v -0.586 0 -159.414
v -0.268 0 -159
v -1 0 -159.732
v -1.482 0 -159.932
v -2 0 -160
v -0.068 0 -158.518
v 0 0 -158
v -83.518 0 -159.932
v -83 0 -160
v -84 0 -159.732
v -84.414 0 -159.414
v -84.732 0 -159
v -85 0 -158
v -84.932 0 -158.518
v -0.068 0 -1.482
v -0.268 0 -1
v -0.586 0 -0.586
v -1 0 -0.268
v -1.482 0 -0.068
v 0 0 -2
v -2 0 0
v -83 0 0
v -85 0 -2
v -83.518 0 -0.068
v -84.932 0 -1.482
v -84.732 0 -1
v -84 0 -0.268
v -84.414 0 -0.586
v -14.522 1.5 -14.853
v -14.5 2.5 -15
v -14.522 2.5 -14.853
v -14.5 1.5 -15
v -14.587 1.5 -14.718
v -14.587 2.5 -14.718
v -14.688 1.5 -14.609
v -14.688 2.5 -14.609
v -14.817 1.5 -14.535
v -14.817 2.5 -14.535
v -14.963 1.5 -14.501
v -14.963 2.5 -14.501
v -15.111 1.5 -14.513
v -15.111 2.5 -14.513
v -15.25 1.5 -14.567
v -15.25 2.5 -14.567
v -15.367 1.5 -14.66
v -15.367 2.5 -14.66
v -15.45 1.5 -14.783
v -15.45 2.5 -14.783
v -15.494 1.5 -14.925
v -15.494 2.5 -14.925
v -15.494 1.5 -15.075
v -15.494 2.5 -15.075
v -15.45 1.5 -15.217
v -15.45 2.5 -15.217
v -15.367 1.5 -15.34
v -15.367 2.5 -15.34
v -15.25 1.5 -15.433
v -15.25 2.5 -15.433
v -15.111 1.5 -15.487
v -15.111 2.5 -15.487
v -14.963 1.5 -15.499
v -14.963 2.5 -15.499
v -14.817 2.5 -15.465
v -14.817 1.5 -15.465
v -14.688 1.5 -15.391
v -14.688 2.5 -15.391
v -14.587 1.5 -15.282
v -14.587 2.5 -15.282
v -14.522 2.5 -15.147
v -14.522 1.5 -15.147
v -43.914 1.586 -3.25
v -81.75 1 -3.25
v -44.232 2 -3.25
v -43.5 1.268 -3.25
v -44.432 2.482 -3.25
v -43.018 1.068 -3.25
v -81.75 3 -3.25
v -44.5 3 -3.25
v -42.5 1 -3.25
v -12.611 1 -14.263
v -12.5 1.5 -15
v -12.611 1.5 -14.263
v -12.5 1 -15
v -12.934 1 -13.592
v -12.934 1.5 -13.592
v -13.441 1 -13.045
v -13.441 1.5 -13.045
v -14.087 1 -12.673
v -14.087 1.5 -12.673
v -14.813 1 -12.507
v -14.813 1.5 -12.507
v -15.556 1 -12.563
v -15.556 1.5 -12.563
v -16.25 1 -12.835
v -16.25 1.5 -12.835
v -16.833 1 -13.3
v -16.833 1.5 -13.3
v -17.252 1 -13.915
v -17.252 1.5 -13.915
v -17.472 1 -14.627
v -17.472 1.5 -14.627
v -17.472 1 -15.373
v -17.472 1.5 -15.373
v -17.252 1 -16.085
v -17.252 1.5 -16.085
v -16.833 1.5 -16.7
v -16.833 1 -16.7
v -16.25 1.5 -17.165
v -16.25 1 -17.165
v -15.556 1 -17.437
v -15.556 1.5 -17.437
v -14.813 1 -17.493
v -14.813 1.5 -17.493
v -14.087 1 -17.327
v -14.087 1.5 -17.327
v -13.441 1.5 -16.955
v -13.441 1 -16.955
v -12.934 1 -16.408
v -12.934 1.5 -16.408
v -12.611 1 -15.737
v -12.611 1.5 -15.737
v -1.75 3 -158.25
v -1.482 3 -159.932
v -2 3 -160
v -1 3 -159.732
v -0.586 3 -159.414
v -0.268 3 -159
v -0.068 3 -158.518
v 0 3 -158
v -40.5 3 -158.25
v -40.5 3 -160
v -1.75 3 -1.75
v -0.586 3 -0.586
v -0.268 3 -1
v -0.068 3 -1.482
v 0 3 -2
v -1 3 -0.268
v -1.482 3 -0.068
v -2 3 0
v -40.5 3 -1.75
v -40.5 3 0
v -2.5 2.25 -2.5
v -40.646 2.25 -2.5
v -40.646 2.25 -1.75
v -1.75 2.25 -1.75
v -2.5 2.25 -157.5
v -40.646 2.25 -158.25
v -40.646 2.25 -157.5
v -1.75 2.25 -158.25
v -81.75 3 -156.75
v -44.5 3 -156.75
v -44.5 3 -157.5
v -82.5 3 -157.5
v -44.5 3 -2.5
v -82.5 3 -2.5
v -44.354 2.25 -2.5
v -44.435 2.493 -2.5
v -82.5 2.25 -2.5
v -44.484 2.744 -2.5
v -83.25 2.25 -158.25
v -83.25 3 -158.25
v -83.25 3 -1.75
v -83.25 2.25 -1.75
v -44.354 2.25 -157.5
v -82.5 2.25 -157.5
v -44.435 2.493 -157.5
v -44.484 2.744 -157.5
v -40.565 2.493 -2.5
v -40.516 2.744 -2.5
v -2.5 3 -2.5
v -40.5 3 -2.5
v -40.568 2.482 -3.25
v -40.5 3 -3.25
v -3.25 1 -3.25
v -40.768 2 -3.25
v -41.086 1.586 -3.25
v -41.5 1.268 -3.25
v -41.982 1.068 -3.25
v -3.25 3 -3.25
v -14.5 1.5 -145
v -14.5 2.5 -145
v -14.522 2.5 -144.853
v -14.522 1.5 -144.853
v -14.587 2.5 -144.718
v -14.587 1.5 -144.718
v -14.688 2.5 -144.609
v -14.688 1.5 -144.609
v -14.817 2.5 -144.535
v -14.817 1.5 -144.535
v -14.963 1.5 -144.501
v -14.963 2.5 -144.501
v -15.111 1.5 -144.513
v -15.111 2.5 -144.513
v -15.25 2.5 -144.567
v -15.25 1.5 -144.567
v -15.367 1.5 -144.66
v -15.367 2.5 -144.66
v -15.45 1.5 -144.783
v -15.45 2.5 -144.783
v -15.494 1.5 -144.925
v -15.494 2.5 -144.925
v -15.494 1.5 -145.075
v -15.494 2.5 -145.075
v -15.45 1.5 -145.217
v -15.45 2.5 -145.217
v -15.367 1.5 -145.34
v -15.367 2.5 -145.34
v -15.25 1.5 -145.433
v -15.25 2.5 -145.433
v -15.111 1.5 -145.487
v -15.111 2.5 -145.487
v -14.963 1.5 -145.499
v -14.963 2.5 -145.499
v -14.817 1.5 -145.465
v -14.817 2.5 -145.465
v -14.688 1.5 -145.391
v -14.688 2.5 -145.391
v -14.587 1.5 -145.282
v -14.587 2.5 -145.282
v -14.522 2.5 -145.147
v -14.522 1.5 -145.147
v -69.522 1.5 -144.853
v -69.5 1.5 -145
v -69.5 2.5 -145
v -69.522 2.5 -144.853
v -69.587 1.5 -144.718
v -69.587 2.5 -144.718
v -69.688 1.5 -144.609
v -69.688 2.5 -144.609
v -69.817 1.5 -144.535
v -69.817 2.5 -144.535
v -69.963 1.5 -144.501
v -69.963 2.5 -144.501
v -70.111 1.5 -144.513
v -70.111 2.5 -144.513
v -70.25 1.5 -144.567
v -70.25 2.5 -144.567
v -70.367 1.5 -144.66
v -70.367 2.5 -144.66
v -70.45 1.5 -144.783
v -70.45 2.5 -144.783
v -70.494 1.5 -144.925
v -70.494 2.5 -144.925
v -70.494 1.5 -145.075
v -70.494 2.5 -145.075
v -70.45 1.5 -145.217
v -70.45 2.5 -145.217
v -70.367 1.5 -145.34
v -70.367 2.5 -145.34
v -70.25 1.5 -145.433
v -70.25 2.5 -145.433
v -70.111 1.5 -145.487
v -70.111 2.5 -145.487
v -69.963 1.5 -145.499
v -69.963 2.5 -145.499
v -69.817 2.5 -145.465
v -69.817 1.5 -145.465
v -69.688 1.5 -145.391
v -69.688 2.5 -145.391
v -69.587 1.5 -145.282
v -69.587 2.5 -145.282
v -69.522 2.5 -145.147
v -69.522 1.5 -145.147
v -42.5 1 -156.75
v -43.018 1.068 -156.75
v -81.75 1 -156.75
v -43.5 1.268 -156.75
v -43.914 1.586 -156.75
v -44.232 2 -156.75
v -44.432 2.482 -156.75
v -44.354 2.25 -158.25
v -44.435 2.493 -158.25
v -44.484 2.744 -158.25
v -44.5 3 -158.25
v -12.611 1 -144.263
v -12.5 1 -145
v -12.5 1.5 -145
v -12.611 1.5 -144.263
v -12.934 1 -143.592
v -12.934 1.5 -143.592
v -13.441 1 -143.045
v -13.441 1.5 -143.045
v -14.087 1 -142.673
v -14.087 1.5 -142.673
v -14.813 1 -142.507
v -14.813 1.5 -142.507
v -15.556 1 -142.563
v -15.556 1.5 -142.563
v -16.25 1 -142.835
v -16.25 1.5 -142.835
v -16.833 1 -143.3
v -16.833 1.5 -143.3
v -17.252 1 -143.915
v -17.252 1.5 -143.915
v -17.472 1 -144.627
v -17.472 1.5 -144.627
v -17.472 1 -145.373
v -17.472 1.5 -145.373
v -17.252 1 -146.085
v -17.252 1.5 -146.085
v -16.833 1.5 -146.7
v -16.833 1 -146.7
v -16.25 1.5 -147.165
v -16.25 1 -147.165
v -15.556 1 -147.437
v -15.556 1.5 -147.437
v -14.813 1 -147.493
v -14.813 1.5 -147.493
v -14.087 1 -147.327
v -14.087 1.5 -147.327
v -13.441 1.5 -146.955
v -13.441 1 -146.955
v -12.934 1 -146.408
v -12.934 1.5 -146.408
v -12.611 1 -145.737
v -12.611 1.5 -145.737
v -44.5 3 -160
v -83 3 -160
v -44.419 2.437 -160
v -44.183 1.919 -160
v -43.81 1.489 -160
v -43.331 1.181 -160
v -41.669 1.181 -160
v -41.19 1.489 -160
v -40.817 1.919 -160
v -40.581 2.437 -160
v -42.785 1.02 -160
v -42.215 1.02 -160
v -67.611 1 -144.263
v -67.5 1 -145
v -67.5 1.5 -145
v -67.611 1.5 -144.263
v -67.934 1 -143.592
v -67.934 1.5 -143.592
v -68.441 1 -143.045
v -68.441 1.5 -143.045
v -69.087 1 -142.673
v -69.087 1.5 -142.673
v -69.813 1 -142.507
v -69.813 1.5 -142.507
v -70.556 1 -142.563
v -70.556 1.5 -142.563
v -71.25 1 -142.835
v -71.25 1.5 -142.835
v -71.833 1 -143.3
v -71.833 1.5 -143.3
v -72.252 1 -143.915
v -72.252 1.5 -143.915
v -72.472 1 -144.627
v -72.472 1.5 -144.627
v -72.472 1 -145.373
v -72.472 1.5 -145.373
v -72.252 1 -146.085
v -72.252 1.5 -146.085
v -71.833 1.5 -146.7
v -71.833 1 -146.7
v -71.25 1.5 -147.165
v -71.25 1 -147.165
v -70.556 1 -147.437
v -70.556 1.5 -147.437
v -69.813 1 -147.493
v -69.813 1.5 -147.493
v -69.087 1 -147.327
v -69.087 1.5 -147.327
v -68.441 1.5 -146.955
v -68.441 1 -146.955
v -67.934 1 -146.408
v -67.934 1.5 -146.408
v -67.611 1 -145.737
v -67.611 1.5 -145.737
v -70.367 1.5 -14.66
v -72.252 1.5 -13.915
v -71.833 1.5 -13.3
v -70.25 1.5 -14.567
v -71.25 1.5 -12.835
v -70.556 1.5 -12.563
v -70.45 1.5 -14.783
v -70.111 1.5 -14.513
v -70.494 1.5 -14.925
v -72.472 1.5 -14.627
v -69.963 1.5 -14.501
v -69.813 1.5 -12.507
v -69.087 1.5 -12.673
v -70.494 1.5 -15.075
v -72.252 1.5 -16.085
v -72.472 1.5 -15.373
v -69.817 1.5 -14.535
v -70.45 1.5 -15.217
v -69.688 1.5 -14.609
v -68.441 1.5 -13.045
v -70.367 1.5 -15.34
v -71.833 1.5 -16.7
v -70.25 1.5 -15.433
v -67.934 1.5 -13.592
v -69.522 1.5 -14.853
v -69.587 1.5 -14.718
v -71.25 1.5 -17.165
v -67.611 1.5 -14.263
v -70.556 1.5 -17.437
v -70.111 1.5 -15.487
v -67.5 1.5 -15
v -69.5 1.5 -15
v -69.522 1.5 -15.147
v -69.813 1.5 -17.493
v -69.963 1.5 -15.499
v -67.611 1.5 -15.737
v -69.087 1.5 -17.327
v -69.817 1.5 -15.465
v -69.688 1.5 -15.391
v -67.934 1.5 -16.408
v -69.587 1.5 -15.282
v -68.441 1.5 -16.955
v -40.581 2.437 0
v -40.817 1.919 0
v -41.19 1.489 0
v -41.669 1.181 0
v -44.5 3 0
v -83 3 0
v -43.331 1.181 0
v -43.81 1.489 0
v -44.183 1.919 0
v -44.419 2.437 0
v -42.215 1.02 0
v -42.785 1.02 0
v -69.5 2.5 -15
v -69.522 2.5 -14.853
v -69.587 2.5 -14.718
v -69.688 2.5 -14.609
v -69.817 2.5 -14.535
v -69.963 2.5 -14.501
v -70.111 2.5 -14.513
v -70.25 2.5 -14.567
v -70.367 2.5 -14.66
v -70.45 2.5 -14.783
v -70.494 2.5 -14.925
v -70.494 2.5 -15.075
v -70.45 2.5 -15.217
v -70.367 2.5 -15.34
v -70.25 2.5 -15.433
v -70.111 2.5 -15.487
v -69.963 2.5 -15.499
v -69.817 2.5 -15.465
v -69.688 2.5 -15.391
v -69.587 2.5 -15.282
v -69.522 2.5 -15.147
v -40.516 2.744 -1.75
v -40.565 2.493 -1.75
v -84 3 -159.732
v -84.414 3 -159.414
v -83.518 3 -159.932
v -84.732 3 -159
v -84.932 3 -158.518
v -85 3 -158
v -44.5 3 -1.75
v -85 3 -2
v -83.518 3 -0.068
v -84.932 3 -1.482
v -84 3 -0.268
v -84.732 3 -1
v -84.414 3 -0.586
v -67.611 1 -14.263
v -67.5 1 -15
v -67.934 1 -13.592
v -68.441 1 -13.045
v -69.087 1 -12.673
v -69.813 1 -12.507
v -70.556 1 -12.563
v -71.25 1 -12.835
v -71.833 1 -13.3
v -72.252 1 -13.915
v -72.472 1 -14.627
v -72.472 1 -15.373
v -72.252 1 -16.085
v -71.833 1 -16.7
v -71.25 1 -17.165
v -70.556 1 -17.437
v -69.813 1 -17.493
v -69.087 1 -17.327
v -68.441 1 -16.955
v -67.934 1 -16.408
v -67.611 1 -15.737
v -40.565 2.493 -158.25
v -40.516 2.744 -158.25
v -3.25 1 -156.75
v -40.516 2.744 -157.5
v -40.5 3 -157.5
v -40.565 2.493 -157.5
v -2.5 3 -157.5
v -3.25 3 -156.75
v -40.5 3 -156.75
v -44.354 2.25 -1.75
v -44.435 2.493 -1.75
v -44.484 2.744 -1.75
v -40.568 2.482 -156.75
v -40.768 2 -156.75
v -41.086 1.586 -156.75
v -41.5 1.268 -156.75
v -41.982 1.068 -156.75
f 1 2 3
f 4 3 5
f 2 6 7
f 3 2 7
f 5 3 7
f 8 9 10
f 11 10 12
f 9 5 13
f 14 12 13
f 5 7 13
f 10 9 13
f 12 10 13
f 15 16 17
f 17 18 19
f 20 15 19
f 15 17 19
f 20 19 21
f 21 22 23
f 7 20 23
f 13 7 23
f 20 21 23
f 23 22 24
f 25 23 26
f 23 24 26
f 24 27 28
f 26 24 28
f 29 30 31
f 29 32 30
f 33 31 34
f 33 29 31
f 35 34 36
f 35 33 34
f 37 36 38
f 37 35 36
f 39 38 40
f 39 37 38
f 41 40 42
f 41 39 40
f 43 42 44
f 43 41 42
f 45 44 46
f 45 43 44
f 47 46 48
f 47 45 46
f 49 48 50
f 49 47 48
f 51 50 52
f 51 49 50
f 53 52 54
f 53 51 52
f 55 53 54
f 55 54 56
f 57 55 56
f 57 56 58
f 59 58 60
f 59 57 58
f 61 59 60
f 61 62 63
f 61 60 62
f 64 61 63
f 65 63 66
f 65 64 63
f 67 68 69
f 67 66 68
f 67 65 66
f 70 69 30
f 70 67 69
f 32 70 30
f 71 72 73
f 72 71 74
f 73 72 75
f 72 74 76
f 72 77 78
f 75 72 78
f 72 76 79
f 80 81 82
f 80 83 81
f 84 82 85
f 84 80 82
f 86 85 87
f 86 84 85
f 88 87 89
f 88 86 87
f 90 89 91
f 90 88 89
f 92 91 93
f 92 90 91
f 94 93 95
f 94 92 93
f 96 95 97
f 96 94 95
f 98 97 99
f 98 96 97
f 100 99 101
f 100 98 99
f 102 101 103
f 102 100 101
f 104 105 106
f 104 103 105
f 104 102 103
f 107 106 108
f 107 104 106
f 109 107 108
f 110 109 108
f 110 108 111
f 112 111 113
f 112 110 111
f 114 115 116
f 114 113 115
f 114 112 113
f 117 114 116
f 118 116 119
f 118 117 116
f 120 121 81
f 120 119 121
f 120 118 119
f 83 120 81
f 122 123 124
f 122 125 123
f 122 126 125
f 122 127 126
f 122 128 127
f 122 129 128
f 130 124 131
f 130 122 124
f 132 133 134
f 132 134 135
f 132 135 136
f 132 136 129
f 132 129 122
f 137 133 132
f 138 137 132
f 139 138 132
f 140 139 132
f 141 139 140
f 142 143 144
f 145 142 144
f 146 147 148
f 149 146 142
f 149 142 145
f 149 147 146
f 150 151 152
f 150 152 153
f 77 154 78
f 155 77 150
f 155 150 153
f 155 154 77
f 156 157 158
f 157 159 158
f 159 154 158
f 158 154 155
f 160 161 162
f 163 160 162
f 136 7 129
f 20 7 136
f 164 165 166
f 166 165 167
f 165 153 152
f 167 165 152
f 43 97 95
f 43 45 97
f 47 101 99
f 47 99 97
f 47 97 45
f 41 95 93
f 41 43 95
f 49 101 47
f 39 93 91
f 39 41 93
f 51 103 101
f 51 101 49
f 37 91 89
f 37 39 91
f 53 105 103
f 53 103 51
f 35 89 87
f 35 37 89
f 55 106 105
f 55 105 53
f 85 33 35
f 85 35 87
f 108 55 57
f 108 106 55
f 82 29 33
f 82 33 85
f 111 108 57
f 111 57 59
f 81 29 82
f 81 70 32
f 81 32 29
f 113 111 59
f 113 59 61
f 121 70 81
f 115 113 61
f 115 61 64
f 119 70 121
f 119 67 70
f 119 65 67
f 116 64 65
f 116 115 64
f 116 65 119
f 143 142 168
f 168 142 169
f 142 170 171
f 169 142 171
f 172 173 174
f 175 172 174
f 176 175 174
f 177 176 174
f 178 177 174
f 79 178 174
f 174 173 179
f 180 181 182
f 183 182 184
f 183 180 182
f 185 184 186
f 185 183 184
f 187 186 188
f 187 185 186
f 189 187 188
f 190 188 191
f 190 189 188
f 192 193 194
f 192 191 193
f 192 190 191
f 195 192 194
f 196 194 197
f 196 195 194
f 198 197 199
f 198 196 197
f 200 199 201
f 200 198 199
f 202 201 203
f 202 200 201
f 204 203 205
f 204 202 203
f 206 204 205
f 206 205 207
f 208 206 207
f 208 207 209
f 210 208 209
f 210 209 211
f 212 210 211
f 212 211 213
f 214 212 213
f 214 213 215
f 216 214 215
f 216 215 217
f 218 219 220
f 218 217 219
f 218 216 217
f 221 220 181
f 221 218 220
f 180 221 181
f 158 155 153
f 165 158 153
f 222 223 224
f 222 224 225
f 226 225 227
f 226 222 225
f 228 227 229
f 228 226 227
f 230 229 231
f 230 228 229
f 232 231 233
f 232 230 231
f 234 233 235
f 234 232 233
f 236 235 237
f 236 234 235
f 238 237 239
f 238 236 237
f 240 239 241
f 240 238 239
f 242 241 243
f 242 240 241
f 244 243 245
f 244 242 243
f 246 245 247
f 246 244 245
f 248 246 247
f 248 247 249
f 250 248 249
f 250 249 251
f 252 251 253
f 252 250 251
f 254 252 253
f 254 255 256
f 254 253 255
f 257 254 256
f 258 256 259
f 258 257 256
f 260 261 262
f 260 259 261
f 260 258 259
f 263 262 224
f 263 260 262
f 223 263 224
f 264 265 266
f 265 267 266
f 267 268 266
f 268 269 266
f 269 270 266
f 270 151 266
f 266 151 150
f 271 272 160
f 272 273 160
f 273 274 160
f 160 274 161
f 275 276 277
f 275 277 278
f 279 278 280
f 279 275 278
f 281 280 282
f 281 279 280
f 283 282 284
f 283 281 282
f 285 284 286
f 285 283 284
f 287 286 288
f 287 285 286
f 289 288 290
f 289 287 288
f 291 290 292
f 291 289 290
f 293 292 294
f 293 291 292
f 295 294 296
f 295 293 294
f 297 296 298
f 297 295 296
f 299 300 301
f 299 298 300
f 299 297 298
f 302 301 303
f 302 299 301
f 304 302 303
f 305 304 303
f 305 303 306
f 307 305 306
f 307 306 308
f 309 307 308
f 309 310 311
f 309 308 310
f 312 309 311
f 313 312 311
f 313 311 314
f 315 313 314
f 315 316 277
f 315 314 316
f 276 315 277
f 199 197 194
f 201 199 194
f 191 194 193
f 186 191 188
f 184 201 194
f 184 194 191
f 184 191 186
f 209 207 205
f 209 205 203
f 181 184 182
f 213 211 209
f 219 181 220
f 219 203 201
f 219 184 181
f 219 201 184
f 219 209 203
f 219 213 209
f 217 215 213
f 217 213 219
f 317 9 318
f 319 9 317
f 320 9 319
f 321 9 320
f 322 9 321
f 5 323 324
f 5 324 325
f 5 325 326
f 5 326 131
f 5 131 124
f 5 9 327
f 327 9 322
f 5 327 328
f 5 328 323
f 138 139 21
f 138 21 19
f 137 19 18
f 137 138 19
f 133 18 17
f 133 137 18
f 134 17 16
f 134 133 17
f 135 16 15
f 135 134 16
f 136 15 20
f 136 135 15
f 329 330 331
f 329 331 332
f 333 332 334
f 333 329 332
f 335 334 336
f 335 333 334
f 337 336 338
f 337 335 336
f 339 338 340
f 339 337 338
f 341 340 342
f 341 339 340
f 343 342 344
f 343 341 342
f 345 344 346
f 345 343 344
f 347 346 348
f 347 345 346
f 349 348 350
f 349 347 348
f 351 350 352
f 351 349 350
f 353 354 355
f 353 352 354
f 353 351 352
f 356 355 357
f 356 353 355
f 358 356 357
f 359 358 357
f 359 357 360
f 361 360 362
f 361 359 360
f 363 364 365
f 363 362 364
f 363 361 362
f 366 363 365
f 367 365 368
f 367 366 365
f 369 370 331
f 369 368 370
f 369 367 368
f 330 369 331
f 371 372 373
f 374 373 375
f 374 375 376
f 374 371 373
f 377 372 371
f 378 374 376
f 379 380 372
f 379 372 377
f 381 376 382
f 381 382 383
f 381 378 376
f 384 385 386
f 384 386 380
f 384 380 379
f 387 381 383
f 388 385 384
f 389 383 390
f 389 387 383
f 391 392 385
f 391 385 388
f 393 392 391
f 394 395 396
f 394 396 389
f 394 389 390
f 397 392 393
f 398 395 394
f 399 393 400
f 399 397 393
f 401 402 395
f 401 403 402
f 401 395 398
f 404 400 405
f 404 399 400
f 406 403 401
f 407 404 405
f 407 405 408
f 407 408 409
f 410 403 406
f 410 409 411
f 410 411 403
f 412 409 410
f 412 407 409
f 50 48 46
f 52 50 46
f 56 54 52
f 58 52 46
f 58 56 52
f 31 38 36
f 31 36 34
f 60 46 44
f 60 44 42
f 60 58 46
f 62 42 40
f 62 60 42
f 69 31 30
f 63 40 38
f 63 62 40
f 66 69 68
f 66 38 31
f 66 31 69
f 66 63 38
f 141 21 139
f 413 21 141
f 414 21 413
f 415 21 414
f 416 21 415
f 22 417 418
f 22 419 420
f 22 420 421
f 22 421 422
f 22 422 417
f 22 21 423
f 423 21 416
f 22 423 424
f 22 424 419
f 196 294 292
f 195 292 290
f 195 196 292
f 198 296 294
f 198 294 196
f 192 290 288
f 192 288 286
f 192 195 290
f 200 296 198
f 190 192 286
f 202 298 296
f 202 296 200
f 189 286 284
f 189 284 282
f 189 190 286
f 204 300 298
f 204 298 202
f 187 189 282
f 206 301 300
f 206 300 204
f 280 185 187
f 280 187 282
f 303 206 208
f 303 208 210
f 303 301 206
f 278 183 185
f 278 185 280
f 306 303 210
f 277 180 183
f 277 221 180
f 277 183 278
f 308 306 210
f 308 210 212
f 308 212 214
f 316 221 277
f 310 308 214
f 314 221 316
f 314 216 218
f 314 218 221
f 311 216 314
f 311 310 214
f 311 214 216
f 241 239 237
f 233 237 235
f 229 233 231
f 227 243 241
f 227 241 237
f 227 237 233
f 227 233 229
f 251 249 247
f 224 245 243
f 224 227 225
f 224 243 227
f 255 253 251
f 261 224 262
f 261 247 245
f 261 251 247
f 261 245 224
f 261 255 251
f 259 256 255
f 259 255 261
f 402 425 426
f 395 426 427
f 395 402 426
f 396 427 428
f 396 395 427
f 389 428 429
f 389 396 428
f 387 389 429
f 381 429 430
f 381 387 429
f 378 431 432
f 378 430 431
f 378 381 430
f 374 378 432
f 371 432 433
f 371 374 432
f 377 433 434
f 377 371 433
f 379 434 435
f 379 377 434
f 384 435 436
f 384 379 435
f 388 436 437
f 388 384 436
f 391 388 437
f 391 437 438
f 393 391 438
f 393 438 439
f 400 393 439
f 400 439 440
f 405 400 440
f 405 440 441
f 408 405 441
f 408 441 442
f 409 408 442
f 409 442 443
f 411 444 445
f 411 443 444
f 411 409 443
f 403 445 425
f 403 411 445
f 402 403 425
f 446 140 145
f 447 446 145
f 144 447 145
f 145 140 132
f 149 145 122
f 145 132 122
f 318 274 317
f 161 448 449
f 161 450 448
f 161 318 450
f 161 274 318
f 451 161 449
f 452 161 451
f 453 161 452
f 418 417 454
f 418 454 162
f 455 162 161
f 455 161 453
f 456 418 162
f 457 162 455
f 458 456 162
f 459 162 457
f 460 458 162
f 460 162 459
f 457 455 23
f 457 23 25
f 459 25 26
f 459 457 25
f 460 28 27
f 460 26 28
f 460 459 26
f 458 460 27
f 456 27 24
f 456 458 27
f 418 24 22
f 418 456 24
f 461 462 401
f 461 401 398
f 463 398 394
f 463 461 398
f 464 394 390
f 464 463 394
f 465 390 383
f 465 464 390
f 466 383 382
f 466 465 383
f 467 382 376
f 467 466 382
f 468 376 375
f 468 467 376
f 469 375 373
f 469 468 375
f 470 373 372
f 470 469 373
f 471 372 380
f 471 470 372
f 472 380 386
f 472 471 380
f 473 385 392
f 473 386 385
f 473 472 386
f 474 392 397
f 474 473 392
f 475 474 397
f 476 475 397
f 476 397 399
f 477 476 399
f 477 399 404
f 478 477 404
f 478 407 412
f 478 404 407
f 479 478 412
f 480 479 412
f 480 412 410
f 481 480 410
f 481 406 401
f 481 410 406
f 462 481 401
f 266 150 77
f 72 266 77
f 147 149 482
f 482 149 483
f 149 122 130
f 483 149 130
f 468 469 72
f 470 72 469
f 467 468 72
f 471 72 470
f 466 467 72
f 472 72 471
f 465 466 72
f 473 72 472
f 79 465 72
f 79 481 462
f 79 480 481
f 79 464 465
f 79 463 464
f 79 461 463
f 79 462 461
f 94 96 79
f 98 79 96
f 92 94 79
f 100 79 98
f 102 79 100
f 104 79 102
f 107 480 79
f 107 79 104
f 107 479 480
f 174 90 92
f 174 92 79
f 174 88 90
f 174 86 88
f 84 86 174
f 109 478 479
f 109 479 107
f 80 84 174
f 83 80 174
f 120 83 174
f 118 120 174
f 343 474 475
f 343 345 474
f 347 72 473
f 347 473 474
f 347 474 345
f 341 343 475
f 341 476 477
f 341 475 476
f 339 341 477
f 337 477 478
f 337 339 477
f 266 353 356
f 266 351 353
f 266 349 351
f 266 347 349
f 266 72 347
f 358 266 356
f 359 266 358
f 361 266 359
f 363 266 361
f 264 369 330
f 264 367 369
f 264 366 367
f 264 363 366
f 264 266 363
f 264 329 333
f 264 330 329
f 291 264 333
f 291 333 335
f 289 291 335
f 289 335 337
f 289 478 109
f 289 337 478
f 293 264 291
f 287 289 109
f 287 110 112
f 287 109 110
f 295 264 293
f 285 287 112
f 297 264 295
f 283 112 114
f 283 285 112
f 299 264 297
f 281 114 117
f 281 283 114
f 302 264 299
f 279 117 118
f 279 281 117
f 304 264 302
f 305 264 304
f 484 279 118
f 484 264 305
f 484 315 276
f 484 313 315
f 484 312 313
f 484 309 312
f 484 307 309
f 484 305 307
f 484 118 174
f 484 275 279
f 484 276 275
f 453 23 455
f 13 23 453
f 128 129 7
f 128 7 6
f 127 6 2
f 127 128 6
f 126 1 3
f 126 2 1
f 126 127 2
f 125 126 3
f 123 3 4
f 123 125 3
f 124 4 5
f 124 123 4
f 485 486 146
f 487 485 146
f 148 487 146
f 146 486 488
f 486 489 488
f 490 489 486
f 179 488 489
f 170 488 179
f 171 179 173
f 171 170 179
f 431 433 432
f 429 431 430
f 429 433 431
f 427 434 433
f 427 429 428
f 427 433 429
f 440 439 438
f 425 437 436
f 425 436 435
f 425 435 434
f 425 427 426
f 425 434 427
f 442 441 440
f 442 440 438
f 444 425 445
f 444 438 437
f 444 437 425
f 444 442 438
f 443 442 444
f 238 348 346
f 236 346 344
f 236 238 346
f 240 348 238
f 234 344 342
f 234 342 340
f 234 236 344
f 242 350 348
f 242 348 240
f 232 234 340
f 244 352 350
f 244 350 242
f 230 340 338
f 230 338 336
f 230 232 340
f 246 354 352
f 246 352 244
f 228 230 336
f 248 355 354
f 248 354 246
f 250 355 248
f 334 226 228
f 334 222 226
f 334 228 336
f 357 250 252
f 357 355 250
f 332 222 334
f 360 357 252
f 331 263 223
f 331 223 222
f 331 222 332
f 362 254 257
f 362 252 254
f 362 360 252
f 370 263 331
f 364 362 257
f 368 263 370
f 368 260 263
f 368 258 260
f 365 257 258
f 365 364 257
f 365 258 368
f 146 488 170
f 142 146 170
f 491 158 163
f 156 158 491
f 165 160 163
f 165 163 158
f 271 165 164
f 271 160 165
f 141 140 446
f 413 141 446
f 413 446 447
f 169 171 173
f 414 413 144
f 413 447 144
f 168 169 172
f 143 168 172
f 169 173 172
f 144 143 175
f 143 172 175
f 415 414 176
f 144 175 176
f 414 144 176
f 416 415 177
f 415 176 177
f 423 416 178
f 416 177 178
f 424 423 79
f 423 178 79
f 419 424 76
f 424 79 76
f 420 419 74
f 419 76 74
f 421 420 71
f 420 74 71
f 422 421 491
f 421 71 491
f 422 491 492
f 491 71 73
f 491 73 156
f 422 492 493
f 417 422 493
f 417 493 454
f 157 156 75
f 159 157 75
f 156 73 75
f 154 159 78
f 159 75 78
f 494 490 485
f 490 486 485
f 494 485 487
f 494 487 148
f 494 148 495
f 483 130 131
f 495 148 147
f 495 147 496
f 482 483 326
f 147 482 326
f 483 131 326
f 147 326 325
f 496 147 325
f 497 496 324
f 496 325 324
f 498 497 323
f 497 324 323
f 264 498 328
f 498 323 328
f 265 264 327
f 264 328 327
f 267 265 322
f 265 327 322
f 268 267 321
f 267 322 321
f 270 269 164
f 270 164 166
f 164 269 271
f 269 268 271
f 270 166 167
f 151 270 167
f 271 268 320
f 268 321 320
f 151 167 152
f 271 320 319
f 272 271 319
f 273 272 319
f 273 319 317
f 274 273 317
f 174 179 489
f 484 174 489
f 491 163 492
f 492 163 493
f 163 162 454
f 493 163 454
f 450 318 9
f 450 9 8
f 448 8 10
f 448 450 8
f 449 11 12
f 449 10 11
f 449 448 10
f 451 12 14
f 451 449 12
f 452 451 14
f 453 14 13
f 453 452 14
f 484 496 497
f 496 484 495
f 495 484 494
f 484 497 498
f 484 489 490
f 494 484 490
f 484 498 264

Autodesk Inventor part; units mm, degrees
ref_plane "YZ Plane" through (0, 0, 0) normal (1, 0, 0) x (0, 1, 0)
ref_plane "XZ Plane" through (0, 0, 0) normal (0, 1, 0) x (-1, 0, 0)
ref_plane "XY Plane" through (0, 0, 0) normal (0, 0, 1) x (1, 0, 0)
sketch "Sketch1" plane through (0, 0, 0) normal (0, 1, 0) x (-1, 0, 0)
  line L0 (0, 0) -> (85, 0)
  line L1 (85, 0) -> (85, -160)
  line L2 (85, -160) -> (0, -160)
  line L3 (0, -160) -> (0, 0)
  dimension "d0" = 85
  dimension "d1" = 160
extrude "Extrusion1" add sketch "Sketch1" along normal blind 3
fillet "Fillet1" radius 2 4 edges at (0, 1.5, 0) (-85, 1.5, 0) (-85, 1.5, -160) (0, 1.5, -160)
sketch "Sketch2" plane through (0, 3, 0) normal (0, 1, 0) x (1, 0, 0)
  arc A0 (0, 158) -> (-2, 160) centre (-2, 158) ccw projected
  line L0 (-2, 160) -> (-83, 160) projected
  arc A1 (-83, 160) -> (-85, 158) centre (-83, 158) ccw projected
  line L1 (-85, 158) -> (-85, 2) projected
  arc A2 (-85, 2) -> (-83, 0) centre (-83, 2) ccw projected
  line L2 (-83, 0) -> (-2, 0) projected
  arc A3 (-2, 0) -> (0, 2) centre (-2, 2) ccw projected
  line L3 (0, 2) -> (0, 158) projected
  line L4 (-82.5, 2.5) -> (-82.5, 157.5)
  line L5 (-82.5, 157.5) -> (-2.5, 157.5)
  line L6 (-2.5, 157.5) -> (-2.5, 2.5)
  line L7 (-2.5, 2.5) -> (-82.5, 2.5)
  line L8 (-81.75, 156.75) -> (-81.75, 3.25)
  line L9 (-81.75, 3.25) -> (-3.25, 3.25)
  line L10 (-3.25, 3.25) -> (-3.25, 156.75)
  line L11 (-3.25, 156.75) -> (-81.75, 156.75)
  line L12 (-83.25, 158.25) -> (-83.25, 1.75)
  line L13 (-83.25, 1.75) -> (-1.75, 1.75)
  line L14 (-1.75, 1.75) -> (-1.75, 158.25)
  line L15 (-1.75, 158.25) -> (-83.25, 158.25)
  point P0 (0, 0)
  dimension "d5" = 2.5
  dimension "d6" = 0.75
  dimension "d31" = 0.75
extrude "Extrusion2" cut sketch "Sketch2" against normal blind 2 contours L11 L10 L9 L8
extrude "Extrusion3" cut sketch "Sketch2" against normal blind 0.75 contours L15 L14 L13 L12
sketch "Sketch3" plane through (0, 1, 0) normal (0, 1, 0) x (1, 0, 0)
  circle A0 centre (-70, 15) radius 2.5
  circle A1 centre (-15, 15) radius 2.5
  circle A2 centre (-70, 145) radius 2.5
  circle A3 centre (-15, 145) radius 2.5
  circle A4 centre (-70, 15) radius 0.5
  circle A5 centre (-15, 15) radius 0.5
  circle A6 centre (-15, 145) radius 0.5
  circle A7 centre (-70, 145) radius 0.5
  line L0 (-85, 158) -> (-85, 2) projected
  line L1 (-83, 0) -> (-2, 0) projected
  line L2 (0, 2) -> (0, 158) projected
  line L3 (-2, 160) -> (-83, 160) projected
  point P0 (0, 0)
  dimension "d11" = 5
  dimension "d12" = 5
  dimension "d13" = 5
  dimension "d14" = 5
  dimension "d15" = 2
  dimension "d16" = 2
  dimension "d17" = 2
  dimension "d18" = 2
  dimension "d19" = 15
  dimension "d20" = 15
  dimension "d21" = 15
  dimension "d22" = 15
  dimension "d23" = 15
  dimension "d24" = 15
  dimension "d25" = 15
  dimension "d26" = 15
extrude "Extrusion4" add sketch "Sketch3" along normal blind 1.5 contours A4 | A5 | A6 | A7
extrude "Extrusion5" add sketch "Sketch3" along normal blind 0.5 contours A0 | A1 | A2 | A3 | A4 | A6
sketch "Sketch4" plane through (-2, 0, -160) normal (0, 0, -1) x (-1, 0, 0)
  line L0 (1.25, 3) -> (79.75, 3) projected
  arc A0 (38.5, 3) -> (42.5, 3) centre (40.5, 3) ccw
  line L1 (0, 0) -> (81, 0) projected
  line L2 (0, 3) -> (81, 3) projected
  line L3 (79.75, 1) -> (1.25, 1) projected
  point P0 (-2, 0)
  point P1 (-2, 3)
  point P2 (40.5, 3)
  point P3 (38.5, 3)
  dimension "d32" = 42.5
  dimension "d33" = 3
extrude "Extrusion6" cut sketch "Sketch4" against normal through all
properties part number "BOTTOM_COVER"
